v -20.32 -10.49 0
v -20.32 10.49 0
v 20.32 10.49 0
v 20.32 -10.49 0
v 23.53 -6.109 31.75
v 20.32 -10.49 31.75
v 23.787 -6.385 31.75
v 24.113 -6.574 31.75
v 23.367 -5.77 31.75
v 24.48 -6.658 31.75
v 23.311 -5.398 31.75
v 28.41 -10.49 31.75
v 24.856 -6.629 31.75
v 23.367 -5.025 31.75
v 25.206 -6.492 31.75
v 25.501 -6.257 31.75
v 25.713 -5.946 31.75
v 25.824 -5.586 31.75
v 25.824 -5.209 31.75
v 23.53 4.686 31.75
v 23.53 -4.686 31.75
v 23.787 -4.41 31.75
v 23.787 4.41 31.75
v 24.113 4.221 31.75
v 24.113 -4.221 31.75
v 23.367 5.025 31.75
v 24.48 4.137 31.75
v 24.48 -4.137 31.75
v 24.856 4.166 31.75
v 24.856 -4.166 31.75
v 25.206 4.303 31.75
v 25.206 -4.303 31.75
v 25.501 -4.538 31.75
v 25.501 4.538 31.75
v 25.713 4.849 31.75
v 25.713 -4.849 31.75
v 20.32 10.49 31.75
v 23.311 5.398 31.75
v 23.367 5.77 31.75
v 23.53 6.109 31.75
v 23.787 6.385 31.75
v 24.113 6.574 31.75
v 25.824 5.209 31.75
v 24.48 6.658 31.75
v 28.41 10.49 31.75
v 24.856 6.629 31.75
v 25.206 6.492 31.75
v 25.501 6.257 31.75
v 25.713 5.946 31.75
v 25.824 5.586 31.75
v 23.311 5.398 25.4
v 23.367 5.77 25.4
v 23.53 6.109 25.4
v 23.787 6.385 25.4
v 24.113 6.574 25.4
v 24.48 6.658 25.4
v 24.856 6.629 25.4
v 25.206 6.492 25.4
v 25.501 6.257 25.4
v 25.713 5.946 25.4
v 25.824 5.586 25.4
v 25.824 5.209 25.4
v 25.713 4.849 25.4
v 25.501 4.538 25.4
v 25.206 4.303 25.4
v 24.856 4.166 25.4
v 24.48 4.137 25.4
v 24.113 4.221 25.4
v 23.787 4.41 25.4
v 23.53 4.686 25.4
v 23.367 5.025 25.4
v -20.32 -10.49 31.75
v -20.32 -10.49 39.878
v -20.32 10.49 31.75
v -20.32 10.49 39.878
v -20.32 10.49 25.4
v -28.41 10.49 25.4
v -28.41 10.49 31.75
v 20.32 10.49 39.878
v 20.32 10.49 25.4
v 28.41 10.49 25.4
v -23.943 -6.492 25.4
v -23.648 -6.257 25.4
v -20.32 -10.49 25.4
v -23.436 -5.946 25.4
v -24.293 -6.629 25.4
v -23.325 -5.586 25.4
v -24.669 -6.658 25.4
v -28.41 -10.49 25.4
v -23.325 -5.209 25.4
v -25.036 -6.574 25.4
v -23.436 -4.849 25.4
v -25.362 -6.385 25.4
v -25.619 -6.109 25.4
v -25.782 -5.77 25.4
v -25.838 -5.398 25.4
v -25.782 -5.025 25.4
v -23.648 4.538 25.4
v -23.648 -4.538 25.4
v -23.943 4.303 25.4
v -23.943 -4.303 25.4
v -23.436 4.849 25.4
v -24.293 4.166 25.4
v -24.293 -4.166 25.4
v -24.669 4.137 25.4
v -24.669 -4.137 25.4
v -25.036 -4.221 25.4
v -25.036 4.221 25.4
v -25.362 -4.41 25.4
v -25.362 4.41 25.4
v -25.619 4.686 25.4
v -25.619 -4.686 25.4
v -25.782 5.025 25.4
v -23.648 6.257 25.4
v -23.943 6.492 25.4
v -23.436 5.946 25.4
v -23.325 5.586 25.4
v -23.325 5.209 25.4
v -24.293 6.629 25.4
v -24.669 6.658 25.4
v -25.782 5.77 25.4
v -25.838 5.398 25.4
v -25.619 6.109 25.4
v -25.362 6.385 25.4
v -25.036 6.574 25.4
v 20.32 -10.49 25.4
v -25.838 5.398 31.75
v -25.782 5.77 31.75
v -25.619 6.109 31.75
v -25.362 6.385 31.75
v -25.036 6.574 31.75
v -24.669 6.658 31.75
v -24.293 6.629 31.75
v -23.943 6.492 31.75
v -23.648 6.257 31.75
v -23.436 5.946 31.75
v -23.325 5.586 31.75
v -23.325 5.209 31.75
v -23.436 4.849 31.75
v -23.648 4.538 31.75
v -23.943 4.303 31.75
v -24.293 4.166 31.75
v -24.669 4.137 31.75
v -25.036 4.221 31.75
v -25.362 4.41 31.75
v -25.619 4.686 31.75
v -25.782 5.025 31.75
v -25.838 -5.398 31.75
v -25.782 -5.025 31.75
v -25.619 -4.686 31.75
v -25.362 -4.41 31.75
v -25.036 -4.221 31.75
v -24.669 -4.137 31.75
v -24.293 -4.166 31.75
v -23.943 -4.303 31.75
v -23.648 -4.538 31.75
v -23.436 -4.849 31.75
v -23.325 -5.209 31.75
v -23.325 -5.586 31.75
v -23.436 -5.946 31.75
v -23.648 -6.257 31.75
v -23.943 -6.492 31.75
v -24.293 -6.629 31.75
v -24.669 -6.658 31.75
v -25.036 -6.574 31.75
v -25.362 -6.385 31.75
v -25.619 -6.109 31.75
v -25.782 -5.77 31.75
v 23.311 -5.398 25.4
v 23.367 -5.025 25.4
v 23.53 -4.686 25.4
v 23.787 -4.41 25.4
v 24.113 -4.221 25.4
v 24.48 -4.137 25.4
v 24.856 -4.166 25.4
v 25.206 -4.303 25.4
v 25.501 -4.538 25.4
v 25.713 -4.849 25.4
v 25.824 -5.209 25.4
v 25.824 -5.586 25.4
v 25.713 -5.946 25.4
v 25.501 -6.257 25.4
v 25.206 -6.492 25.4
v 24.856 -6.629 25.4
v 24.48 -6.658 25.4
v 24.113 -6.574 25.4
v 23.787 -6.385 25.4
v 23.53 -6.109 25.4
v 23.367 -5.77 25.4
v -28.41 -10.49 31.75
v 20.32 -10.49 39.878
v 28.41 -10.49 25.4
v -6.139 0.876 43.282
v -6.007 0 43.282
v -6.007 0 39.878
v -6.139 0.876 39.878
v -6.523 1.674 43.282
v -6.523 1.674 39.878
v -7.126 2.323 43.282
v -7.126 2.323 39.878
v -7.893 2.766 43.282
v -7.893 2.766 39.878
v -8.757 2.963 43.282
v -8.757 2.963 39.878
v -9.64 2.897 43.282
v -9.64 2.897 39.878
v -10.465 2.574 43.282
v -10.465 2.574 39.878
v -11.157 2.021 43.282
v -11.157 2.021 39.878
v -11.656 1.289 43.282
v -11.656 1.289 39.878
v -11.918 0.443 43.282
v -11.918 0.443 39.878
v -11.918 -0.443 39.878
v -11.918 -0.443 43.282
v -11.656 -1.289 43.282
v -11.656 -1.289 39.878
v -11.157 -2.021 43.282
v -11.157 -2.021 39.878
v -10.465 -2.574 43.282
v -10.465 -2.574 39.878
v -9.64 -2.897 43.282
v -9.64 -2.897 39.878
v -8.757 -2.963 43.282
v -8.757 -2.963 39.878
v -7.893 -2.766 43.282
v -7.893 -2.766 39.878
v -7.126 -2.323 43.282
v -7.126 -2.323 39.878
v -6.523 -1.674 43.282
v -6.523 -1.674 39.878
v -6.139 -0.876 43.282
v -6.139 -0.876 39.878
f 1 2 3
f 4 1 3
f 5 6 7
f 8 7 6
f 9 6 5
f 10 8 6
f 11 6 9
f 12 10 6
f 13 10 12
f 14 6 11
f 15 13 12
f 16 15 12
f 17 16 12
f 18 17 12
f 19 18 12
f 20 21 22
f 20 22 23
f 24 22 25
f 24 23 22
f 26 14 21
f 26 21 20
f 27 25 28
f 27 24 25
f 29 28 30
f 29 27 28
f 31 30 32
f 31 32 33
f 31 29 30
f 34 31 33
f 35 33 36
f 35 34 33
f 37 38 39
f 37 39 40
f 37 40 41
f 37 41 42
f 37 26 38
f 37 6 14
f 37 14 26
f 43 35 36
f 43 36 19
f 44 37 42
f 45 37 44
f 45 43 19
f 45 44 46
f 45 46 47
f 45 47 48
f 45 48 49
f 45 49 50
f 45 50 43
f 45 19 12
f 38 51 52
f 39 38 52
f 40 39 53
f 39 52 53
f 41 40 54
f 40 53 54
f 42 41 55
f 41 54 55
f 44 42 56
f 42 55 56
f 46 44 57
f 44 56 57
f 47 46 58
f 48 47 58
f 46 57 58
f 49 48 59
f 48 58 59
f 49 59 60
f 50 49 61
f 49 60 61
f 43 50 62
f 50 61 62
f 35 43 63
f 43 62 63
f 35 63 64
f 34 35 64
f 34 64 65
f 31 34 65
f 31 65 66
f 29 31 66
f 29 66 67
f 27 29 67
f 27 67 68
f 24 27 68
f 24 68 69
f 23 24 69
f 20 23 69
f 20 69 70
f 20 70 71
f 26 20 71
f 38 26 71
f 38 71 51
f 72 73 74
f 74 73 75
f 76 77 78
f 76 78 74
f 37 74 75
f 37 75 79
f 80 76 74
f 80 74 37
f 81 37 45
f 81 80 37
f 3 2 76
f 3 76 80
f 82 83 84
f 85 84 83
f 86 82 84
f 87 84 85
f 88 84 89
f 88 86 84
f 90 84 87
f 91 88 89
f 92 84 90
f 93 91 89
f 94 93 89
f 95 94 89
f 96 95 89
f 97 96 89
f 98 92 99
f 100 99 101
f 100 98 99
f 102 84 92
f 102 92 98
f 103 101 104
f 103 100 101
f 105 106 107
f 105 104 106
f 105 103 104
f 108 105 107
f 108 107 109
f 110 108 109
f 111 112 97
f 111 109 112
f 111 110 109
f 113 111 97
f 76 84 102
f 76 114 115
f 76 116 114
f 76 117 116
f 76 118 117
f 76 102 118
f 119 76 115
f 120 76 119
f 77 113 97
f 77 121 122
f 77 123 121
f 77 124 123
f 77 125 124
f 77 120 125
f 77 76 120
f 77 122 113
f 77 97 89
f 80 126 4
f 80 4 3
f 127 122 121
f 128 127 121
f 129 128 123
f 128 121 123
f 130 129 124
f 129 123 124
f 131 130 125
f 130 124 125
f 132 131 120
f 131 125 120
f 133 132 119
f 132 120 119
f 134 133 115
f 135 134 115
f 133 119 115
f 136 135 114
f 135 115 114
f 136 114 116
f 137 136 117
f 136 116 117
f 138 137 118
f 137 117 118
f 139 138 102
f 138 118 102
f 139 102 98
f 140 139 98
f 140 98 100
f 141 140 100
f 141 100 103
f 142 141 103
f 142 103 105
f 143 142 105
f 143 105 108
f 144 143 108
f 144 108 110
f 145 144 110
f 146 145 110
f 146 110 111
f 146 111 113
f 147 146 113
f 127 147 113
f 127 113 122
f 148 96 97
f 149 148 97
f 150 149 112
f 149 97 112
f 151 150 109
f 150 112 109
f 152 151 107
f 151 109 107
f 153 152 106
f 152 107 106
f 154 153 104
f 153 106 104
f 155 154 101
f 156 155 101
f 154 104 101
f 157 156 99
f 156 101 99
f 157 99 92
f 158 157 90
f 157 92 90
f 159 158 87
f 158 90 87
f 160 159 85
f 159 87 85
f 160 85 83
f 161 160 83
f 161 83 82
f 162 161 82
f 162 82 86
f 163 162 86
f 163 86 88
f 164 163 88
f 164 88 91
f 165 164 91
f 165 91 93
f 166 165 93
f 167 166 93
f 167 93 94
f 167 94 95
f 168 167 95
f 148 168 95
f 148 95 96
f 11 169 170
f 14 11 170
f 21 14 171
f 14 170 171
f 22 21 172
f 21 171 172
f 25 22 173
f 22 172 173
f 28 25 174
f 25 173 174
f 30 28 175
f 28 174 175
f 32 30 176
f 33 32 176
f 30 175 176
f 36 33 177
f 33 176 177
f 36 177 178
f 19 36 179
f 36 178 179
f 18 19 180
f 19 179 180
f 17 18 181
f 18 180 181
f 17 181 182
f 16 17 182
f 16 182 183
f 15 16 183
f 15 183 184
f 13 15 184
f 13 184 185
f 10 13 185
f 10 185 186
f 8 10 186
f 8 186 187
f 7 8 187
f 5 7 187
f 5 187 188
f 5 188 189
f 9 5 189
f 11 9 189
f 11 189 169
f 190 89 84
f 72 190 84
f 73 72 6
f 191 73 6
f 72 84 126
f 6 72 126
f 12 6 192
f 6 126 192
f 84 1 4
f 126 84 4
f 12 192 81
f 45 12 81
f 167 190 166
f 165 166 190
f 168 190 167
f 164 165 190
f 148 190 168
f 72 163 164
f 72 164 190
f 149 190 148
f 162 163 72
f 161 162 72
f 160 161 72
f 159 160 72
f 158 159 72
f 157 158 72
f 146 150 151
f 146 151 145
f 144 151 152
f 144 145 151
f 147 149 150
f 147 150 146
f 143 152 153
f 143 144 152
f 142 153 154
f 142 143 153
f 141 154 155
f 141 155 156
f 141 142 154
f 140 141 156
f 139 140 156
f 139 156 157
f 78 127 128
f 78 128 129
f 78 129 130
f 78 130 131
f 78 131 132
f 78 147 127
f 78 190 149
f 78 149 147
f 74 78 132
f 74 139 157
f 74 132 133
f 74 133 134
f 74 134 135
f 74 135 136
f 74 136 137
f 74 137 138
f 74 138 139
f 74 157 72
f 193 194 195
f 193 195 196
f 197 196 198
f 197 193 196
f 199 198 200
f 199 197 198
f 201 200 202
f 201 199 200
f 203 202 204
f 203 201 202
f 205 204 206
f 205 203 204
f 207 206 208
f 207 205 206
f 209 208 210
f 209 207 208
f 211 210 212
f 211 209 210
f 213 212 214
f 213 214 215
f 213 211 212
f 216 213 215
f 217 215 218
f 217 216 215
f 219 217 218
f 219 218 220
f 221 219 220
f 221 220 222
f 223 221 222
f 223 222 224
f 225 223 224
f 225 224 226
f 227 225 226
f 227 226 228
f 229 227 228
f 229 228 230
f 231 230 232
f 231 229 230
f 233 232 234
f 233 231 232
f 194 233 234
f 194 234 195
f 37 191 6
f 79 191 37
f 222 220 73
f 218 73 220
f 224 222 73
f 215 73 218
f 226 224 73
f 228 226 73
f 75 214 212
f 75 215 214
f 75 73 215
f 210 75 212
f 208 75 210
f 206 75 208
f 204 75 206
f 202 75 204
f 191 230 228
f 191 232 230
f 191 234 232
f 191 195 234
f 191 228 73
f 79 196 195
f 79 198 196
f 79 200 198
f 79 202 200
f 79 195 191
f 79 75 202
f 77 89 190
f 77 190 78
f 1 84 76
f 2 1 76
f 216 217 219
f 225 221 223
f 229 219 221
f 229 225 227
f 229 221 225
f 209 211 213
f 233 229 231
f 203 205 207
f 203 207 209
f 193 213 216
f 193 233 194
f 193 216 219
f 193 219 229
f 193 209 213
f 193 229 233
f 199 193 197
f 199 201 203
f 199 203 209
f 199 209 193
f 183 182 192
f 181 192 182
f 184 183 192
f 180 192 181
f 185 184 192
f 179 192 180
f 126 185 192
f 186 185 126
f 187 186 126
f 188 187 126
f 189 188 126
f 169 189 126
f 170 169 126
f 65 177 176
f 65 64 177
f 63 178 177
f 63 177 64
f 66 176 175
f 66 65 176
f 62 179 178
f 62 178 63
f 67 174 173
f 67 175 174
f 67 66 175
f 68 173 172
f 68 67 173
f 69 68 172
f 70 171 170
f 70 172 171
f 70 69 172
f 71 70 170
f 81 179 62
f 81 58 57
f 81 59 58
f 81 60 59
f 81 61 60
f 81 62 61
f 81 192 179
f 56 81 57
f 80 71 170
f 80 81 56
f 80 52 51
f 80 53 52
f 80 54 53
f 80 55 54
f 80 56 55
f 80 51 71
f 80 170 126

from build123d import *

# Parameters (mm, degrees)
SKETCH1_W                    = 56.8198
SKETCH1_H                    = 20.9804
EXTRUDE1_DEPTH               = 43.2816
SKETCH3_OUTSIDE_W            = 73.708
SKETCH3_OUTSIDE_H            = 37.868
SKETCH3_OUTSIDE_R            = 2.9718
EXTRUDE2_DEPTH               = 3.4036
SKETCH8_W                    = 8.0899
SKETCH8_H                    = 20.9804
EXTRUDE5_DEPTH               = 25.4
F_39_0_0995_DIAMETER_HOLE1_D = 2.5273
SKETCH13_W                   = 8.0899
SKETCH13_H                   = 20.9804
EXTRUDE6_DEPTH               = 8.128


with BuildPart() as part:
    # Sketch1 → Extrude1 (new body)
    with BuildSketch(Plane.XY):
        Rectangle(SKETCH1_W, SKETCH1_H)
    extrude(amount=EXTRUDE1_DEPTH)

    # Sketch3 outside → Extrude2 (cut)
    with BuildSketch(Plane.XY.offset(43.2816)):
        Rectangle(SKETCH3_OUTSIDE_W, SKETCH3_OUTSIDE_H)
        with Locations((-8.9789, 0)):
            Circle(SKETCH3_OUTSIDE_R, mode=Mode.SUBTRACT)
    extrude(amount=-EXTRUDE2_DEPTH, mode=Mode.SUBTRACT)

    # Sketch8 → Extrude5 (cut)
    with BuildSketch(Plane(origin=(0, 0, 0), x_dir=(-1, 0, 0), z_dir=(0, 0, -1))):
        with Locations((-24.36495, 0)):
            Rectangle(SKETCH8_W, SKETCH8_H)
        with Locations((24.36495, 0)):
            Rectangle(SKETCH8_W, SKETCH8_H)
    extrude(amount=-EXTRUDE5_DEPTH, mode=Mode.SUBTRACT)

    # #39 (0.0995) Diameter Hole1 (through all)
    with Locations(Plane(origin=(-24.5745, 5.3975, 39.878), x_dir=(1, 0, 0), z_dir=(0, 0, 1))):
        with Locations((0, 0), (0, -10.795), (49.149, 0), (49.149, -10.795)):
            Hole(F_39_0_0995_DIAMETER_HOLE1_D / 2)

    # Sketch13 → Extrude6 (cut)
    with BuildSketch(Plane.XY.offset(39.878)):
        with Locations((-24.36495, 0)):
            Rectangle(SKETCH13_W, SKETCH13_H)
        with Locations((24.36495, 0)):
            Rectangle(SKETCH13_W, SKETCH13_H)
    extrude(amount=-EXTRUDE6_DEPTH, mode=Mode.SUBTRACT)


solid = part.part
